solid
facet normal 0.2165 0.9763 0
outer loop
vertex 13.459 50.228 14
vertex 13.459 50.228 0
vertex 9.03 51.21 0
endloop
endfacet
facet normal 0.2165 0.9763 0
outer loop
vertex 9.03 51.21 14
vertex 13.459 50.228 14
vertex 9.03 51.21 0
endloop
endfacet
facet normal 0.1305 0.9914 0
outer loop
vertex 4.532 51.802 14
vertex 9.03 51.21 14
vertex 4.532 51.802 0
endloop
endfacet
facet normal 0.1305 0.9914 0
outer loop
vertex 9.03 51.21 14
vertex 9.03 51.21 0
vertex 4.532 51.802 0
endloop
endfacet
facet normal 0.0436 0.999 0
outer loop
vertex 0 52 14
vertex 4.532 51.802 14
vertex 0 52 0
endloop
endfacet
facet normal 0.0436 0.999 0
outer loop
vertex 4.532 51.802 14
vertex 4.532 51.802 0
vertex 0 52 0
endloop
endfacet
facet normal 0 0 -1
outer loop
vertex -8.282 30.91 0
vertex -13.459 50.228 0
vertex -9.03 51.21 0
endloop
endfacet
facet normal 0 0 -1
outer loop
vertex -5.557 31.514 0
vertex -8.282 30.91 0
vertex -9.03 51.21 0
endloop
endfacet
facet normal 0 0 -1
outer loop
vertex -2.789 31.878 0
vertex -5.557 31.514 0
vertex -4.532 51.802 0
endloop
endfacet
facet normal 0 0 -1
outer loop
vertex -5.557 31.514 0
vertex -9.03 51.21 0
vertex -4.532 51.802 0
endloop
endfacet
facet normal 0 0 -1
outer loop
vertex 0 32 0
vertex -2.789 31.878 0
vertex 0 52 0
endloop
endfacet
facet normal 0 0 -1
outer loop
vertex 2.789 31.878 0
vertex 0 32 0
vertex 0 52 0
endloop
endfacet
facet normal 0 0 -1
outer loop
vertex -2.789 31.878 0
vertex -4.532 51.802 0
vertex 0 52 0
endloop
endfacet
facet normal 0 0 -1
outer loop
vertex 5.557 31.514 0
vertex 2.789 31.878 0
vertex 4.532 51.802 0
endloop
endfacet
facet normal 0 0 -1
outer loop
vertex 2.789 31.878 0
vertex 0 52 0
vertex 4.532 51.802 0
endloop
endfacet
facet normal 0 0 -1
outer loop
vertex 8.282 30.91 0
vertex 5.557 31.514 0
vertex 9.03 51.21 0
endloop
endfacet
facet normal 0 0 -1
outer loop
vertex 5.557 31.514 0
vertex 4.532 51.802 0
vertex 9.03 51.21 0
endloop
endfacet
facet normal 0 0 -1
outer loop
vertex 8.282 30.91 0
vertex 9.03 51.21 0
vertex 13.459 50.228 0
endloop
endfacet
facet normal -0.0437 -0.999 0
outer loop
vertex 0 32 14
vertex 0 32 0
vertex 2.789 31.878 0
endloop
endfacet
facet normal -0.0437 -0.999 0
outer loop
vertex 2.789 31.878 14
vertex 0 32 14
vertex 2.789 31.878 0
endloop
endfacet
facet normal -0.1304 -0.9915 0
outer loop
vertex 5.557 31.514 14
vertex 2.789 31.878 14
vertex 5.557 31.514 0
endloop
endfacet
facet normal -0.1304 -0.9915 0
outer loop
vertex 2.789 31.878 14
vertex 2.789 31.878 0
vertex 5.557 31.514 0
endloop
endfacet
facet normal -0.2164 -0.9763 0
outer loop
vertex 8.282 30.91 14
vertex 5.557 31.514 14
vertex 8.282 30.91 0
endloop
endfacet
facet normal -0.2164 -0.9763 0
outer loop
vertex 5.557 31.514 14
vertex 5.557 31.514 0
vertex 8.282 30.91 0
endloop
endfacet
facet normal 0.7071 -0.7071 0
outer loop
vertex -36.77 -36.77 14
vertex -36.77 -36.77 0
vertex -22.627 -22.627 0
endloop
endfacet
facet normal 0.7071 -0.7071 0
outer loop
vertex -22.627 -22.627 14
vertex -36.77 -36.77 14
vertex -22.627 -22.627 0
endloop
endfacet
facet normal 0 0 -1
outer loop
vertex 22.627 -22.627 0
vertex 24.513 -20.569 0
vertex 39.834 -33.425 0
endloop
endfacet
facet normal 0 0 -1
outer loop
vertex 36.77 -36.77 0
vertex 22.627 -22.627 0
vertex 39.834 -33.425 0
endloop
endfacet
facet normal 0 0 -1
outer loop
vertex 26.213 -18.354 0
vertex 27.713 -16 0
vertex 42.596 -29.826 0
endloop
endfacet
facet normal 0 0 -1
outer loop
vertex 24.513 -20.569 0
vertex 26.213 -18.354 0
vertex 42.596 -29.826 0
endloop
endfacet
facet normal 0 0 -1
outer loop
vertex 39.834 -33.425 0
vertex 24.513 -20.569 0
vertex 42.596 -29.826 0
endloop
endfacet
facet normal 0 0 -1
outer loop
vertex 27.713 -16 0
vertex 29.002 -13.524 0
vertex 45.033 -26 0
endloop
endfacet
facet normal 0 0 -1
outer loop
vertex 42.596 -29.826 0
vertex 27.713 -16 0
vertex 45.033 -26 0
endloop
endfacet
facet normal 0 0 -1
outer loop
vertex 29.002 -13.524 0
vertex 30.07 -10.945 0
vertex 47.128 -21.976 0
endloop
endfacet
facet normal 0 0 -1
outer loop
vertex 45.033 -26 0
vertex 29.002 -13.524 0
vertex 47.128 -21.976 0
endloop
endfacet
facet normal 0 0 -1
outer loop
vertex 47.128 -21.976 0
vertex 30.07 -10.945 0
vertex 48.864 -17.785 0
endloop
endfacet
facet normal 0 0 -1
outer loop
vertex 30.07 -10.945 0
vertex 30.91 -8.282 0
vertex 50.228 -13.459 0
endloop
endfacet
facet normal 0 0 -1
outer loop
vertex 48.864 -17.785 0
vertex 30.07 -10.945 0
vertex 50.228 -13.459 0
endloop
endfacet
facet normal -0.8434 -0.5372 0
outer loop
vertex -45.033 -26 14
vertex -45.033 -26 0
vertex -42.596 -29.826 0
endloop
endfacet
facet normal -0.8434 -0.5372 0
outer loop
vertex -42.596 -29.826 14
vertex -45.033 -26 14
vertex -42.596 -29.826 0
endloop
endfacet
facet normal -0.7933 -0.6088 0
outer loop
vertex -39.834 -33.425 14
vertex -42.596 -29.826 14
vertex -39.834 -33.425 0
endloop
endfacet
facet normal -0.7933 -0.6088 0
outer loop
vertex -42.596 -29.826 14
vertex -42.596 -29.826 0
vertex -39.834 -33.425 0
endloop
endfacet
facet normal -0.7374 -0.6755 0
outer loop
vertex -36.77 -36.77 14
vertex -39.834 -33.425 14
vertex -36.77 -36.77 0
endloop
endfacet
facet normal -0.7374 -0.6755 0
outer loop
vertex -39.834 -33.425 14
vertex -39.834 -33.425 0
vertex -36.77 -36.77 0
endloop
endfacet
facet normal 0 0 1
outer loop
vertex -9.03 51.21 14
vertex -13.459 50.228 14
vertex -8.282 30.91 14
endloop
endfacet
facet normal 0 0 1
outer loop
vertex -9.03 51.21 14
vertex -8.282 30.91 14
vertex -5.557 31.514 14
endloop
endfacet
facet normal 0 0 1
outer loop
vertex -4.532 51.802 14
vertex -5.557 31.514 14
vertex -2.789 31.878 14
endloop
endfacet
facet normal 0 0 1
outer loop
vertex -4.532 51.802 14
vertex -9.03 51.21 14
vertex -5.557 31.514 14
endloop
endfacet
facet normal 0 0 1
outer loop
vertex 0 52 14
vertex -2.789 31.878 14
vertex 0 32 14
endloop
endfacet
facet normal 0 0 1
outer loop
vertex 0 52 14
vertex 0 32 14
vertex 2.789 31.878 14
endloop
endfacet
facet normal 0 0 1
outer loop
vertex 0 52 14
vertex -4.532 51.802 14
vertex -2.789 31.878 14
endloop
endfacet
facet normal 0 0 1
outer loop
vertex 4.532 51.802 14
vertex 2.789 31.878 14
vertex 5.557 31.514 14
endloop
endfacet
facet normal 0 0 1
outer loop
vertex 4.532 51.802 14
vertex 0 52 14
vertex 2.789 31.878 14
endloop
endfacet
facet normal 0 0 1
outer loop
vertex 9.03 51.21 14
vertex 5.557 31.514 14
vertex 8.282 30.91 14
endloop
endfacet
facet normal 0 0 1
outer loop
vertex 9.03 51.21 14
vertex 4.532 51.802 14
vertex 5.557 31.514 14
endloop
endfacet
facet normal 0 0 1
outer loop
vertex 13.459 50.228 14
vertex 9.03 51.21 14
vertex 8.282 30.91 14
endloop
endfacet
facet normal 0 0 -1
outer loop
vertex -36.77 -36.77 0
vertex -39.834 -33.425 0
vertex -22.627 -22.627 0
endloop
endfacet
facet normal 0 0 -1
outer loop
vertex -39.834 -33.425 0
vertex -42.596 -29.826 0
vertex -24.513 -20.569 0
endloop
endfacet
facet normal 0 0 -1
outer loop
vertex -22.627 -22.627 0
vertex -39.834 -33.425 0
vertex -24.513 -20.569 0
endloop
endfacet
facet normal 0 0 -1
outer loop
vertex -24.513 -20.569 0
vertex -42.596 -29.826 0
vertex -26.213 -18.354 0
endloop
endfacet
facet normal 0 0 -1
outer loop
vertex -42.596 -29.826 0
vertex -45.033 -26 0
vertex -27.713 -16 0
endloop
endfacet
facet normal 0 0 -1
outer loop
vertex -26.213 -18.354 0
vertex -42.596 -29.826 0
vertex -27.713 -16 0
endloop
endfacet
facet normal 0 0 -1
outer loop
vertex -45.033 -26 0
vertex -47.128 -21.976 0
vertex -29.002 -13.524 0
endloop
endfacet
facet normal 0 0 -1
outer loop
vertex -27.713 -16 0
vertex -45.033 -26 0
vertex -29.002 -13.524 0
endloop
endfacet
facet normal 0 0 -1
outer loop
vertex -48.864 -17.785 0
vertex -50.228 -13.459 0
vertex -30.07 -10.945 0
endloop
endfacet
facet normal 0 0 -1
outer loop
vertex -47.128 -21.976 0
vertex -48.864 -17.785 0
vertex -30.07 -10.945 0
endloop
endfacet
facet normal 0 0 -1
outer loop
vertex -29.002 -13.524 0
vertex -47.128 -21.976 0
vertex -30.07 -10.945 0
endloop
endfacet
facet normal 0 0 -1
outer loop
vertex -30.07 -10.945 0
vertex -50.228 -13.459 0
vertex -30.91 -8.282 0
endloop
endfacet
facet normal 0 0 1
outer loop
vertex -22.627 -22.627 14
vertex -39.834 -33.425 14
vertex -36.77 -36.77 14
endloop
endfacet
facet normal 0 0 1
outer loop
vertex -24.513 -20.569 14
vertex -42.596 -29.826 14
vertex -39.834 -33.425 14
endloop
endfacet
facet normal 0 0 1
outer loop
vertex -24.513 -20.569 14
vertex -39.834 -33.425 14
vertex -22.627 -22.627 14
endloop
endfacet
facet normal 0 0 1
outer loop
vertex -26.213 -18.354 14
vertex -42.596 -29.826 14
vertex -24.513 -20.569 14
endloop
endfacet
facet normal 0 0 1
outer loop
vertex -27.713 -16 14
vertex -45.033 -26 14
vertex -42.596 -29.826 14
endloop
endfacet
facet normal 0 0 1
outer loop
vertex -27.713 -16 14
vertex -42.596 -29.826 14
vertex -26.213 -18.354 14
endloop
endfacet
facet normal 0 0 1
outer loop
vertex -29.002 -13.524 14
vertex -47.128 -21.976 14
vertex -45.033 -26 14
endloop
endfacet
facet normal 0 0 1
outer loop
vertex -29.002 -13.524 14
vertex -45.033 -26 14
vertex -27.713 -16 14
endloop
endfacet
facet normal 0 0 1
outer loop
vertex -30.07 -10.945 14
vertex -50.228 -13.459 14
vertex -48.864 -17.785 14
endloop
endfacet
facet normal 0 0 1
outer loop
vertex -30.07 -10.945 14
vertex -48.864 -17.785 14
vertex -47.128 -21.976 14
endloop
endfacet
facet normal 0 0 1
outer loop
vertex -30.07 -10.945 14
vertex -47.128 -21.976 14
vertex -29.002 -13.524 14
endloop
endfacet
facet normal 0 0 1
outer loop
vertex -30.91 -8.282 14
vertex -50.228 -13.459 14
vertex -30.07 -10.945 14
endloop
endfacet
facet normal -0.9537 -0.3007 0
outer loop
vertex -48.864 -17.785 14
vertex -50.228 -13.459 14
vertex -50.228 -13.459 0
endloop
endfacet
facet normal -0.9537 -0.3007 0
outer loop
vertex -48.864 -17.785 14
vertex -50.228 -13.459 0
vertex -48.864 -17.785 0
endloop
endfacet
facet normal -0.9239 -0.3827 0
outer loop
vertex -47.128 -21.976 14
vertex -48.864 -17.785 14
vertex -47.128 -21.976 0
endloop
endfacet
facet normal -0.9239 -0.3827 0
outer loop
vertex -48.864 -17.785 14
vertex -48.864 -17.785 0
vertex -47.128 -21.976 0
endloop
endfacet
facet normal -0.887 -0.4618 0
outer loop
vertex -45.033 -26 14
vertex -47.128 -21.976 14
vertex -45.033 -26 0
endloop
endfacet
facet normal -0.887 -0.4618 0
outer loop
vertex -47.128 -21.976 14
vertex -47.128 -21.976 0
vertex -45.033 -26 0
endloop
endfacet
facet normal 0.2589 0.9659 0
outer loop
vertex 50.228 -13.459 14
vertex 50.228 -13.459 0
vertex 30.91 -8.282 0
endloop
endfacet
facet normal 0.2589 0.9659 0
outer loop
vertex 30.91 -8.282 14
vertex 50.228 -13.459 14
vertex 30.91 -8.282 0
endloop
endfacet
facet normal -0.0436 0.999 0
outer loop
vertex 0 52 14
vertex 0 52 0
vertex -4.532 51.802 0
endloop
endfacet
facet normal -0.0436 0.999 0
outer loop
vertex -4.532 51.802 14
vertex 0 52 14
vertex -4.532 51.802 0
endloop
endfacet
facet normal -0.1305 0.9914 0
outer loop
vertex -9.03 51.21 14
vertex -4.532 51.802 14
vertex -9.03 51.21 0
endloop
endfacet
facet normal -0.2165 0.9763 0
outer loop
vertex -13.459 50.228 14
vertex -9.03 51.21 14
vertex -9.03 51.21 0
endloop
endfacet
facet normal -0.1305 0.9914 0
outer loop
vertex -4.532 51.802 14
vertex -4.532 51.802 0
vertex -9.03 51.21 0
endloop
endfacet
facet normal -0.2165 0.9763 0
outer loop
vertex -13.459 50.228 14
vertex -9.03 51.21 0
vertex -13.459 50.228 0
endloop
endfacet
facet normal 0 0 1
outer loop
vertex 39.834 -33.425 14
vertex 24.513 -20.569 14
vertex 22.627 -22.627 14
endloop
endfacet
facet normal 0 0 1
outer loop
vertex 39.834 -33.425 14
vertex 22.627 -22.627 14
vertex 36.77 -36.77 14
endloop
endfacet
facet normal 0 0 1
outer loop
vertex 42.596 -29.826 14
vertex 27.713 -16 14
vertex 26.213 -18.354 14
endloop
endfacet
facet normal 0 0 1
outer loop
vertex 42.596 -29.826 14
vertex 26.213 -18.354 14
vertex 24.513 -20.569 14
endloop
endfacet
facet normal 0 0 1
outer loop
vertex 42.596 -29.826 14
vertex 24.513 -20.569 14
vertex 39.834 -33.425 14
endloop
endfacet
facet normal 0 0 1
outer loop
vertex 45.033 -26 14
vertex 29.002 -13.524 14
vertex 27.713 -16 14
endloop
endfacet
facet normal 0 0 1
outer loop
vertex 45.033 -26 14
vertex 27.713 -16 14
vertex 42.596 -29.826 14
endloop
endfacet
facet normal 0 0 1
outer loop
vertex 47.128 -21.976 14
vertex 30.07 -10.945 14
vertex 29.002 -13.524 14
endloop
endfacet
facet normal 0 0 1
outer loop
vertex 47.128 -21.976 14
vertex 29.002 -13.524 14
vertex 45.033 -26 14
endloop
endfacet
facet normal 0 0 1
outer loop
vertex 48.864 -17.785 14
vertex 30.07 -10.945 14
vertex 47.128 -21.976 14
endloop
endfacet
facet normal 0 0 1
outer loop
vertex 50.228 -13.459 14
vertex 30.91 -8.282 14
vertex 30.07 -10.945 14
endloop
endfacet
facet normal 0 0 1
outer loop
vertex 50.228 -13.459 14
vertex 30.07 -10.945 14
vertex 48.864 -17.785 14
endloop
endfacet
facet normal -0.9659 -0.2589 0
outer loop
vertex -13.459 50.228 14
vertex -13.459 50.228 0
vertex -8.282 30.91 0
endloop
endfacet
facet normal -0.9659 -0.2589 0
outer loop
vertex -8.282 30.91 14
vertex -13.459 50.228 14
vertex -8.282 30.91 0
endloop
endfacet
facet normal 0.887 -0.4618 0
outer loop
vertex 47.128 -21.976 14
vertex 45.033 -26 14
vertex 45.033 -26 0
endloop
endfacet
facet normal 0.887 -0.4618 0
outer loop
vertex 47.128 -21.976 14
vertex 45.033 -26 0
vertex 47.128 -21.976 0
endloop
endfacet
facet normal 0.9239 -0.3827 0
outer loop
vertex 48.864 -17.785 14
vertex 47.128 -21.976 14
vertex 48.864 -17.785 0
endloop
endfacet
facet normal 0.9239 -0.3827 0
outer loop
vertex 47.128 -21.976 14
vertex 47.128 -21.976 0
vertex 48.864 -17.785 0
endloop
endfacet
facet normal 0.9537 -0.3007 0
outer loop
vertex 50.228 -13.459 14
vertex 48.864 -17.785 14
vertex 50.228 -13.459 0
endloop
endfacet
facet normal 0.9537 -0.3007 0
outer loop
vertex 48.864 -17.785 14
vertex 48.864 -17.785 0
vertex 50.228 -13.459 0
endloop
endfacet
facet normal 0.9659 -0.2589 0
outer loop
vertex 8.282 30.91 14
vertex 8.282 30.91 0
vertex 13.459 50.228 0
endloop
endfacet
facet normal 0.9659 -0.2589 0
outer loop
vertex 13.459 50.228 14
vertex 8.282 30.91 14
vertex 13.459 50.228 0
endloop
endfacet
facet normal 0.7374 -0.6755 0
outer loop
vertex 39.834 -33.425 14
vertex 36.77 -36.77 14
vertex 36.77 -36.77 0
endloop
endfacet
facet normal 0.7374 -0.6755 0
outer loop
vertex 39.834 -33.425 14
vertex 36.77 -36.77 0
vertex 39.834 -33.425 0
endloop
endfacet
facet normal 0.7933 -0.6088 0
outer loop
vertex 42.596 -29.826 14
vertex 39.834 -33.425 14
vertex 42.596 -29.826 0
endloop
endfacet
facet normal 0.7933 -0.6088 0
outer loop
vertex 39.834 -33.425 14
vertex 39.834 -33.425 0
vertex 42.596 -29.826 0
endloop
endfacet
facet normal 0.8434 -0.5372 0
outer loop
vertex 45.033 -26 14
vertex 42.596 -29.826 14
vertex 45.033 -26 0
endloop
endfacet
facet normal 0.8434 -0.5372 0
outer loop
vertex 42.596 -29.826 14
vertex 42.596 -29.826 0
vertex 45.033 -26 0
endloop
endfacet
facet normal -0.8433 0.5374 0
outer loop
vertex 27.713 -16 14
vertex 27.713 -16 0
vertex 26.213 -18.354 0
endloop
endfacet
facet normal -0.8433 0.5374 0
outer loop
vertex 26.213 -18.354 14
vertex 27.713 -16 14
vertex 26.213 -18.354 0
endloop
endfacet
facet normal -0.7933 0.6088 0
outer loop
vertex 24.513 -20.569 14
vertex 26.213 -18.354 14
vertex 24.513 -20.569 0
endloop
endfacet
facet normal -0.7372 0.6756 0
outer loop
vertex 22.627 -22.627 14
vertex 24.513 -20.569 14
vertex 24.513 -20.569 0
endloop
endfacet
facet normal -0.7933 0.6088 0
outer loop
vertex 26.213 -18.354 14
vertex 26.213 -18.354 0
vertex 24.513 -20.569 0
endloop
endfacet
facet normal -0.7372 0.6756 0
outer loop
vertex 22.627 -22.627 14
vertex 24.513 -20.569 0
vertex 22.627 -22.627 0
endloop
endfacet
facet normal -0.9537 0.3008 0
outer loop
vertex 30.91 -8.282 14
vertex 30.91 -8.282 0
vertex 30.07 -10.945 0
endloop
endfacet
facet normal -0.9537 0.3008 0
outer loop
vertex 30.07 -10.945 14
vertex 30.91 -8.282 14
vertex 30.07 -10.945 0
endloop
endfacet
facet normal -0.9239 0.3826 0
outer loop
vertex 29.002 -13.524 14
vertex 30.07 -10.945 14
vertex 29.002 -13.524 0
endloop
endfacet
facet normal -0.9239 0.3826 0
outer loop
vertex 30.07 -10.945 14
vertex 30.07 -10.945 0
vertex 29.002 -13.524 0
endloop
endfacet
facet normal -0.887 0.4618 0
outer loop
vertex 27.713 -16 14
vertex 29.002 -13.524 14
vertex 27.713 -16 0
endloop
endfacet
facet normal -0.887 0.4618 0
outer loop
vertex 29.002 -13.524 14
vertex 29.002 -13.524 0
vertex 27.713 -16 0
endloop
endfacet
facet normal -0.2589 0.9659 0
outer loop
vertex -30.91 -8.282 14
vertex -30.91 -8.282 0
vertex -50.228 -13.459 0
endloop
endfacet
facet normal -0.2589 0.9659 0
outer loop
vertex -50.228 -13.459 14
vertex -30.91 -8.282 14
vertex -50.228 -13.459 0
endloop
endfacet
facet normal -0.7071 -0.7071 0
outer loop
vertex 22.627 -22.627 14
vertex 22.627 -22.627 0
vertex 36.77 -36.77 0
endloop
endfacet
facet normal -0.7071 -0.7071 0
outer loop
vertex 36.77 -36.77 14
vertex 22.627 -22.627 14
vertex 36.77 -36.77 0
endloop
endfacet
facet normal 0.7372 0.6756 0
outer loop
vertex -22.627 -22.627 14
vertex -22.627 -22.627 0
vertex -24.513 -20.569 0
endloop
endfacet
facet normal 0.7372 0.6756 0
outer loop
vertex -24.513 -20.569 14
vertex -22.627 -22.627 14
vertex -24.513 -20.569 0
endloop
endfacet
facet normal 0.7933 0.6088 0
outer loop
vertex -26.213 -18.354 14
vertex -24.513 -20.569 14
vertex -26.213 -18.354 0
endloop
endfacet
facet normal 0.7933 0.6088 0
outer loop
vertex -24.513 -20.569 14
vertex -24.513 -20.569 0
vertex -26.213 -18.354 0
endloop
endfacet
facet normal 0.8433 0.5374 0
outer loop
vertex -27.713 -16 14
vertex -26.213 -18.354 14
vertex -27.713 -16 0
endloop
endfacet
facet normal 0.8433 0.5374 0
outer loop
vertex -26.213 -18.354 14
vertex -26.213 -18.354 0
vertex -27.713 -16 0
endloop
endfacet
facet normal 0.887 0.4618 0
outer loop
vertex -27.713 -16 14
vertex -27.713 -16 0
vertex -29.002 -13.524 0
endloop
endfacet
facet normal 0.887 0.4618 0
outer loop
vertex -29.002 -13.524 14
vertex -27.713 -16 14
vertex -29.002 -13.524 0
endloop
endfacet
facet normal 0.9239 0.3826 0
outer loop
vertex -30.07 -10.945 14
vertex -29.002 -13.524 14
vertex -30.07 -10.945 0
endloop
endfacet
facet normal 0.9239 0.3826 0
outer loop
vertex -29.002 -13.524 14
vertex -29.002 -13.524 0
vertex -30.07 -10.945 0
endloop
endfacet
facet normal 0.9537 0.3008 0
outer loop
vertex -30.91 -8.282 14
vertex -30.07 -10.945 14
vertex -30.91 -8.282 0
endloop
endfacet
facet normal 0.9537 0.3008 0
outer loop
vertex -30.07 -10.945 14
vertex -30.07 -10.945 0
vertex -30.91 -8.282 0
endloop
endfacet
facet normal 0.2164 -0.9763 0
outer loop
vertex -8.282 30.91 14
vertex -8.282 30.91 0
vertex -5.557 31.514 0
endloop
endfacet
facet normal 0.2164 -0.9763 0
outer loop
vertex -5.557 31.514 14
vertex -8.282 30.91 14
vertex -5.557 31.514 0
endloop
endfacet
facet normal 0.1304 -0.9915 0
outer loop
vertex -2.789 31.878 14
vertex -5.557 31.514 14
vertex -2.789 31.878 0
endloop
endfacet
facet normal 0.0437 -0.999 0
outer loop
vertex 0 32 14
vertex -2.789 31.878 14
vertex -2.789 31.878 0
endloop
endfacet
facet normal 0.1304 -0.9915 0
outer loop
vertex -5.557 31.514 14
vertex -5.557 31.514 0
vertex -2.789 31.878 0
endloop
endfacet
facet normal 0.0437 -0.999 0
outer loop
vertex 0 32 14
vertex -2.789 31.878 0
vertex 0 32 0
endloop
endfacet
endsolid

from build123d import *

# Parameters (mm, degrees)
F1_DEPTH = 14
F2_DEPTH = 14


with BuildPart() as f1:
    # F0 (on Top) → F1 (new body)
    with BuildSketch(Plane.XY):
        with BuildLine():
            Line((8.2822094433, 30.9096264413), (13.4585903453, 50.228142967))
            ThreePointArc((13.4585903453, 50.228142967), (6.7873619954, 51.5551327914), (0, 52))
            Line((0, 52), (0, 32))
            ThreePointArc((0, 32), (4.176838151, 31.726235564), (8.2822094433, 30.9096264413))
        make_face()
        with BuildLine():
            Line((0, 32), (0, 52))
            ThreePointArc((0, 52), (-6.7873619954, 51.5551327914), (-13.4585903453, 50.228142967))
            Line((-13.4585903453, 50.228142967), (-8.2822094433, 30.9096264413))
            ThreePointArc((-8.2822094433, 30.9096264413), (-4.176838151, 31.726235564), (0, 32))
        make_face()
    extrude(amount=F1_DEPTH)

    # F0 (on Top) → F2, piece 2 (join)
    with BuildSketch(Plane.XY):
        with BuildLine():
            Line((0, 32), (0, 52))
            ThreePointArc((0, 52), (-6.7873619954, 51.5551327914), (-13.4585903453, 50.228142967))
            Line((-13.4585903453, 50.228142967), (-8.2822094433, 30.9096264413))
            ThreePointArc((-8.2822094433, 30.9096264413), (-4.176838151, 31.726235564), (0, 32))
        make_face()
        with BuildLine():
            Line((8.2822094433, 30.9096264413), (13.4585903453, 50.228142967))
            ThreePointArc((13.4585903453, 50.228142967), (6.7873619954, 51.5551327914), (0, 52))
            Line((0, 52), (0, 32))
            ThreePointArc((0, 32), (4.176838151, 31.726235564), (8.2822094433, 30.9096264413))
        make_face()
    extrude(amount=F2_DEPTH)


with BuildPart() as f2:
    # F0 (on Top) → F2 (new body)
    with BuildSketch(Plane.XY):
        with BuildLine():
            Line((-30.9096264413, -8.2822094433), (-50.228142967, -13.4585903453))
            ThreePointArc((-50.228142967, -13.4585903453), (-48.0417356906, -19.899538483), (-45.0333209968, -26))
            Line((-45.0333209968, -26), (-27.7128129211, -16))
            ThreePointArc((-27.7128129211, -16), (-29.5641450404, -12.2458698357), (-30.9096264413, -8.2822094433))
        make_face()
        with BuildLine():
            ThreePointArc((-45.0333209968, -26), (-41.2543736951, -31.6555943085), (-36.7695526217, -36.7695526217))
            Line((-36.7695526217, -36.7695526217), (-22.627416998, -22.627416998))
            ThreePointArc((-22.627416998, -22.627416998), (-25.3873068893, -19.4803657283), (-27.7128129211, -16))
            Line((-27.7128129211, -16), (-45.0333209968, -26))
        make_face()
    extrude(amount=F2_DEPTH)


with BuildPart() as f2b:
    # F0 (on Top) → F2, piece 3 (new body)
    with BuildSketch(Plane.XY):
        with BuildLine():
            ThreePointArc((45.0333209968, -26), (48.0417356906, -19.899538483), (50.228142967, -13.4585903453))
            Line((50.228142967, -13.4585903453), (30.9096264413, -8.2822094433))
            ThreePointArc((30.9096264413, -8.2822094433), (29.5641450404, -12.2458698357), (27.7128129211, -16))
            Line((27.7128129211, -16), (45.0333209968, -26))
        make_face()
        with BuildLine():
            ThreePointArc((36.7695526217, -36.7695526217), (41.2543736951, -31.6555943085), (45.0333209968, -26))
            Line((45.0333209968, -26), (27.7128129211, -16))
            ThreePointArc((27.7128129211, -16), (25.3873068893, -19.4803657283), (22.627416998, -22.627416998))
            Line((22.627416998, -22.627416998), (36.7695526217, -36.7695526217))
        make_face()
    extrude(amount=F2_DEPTH)


solid = Compound([f1.part, f2.part, f2b.part])
